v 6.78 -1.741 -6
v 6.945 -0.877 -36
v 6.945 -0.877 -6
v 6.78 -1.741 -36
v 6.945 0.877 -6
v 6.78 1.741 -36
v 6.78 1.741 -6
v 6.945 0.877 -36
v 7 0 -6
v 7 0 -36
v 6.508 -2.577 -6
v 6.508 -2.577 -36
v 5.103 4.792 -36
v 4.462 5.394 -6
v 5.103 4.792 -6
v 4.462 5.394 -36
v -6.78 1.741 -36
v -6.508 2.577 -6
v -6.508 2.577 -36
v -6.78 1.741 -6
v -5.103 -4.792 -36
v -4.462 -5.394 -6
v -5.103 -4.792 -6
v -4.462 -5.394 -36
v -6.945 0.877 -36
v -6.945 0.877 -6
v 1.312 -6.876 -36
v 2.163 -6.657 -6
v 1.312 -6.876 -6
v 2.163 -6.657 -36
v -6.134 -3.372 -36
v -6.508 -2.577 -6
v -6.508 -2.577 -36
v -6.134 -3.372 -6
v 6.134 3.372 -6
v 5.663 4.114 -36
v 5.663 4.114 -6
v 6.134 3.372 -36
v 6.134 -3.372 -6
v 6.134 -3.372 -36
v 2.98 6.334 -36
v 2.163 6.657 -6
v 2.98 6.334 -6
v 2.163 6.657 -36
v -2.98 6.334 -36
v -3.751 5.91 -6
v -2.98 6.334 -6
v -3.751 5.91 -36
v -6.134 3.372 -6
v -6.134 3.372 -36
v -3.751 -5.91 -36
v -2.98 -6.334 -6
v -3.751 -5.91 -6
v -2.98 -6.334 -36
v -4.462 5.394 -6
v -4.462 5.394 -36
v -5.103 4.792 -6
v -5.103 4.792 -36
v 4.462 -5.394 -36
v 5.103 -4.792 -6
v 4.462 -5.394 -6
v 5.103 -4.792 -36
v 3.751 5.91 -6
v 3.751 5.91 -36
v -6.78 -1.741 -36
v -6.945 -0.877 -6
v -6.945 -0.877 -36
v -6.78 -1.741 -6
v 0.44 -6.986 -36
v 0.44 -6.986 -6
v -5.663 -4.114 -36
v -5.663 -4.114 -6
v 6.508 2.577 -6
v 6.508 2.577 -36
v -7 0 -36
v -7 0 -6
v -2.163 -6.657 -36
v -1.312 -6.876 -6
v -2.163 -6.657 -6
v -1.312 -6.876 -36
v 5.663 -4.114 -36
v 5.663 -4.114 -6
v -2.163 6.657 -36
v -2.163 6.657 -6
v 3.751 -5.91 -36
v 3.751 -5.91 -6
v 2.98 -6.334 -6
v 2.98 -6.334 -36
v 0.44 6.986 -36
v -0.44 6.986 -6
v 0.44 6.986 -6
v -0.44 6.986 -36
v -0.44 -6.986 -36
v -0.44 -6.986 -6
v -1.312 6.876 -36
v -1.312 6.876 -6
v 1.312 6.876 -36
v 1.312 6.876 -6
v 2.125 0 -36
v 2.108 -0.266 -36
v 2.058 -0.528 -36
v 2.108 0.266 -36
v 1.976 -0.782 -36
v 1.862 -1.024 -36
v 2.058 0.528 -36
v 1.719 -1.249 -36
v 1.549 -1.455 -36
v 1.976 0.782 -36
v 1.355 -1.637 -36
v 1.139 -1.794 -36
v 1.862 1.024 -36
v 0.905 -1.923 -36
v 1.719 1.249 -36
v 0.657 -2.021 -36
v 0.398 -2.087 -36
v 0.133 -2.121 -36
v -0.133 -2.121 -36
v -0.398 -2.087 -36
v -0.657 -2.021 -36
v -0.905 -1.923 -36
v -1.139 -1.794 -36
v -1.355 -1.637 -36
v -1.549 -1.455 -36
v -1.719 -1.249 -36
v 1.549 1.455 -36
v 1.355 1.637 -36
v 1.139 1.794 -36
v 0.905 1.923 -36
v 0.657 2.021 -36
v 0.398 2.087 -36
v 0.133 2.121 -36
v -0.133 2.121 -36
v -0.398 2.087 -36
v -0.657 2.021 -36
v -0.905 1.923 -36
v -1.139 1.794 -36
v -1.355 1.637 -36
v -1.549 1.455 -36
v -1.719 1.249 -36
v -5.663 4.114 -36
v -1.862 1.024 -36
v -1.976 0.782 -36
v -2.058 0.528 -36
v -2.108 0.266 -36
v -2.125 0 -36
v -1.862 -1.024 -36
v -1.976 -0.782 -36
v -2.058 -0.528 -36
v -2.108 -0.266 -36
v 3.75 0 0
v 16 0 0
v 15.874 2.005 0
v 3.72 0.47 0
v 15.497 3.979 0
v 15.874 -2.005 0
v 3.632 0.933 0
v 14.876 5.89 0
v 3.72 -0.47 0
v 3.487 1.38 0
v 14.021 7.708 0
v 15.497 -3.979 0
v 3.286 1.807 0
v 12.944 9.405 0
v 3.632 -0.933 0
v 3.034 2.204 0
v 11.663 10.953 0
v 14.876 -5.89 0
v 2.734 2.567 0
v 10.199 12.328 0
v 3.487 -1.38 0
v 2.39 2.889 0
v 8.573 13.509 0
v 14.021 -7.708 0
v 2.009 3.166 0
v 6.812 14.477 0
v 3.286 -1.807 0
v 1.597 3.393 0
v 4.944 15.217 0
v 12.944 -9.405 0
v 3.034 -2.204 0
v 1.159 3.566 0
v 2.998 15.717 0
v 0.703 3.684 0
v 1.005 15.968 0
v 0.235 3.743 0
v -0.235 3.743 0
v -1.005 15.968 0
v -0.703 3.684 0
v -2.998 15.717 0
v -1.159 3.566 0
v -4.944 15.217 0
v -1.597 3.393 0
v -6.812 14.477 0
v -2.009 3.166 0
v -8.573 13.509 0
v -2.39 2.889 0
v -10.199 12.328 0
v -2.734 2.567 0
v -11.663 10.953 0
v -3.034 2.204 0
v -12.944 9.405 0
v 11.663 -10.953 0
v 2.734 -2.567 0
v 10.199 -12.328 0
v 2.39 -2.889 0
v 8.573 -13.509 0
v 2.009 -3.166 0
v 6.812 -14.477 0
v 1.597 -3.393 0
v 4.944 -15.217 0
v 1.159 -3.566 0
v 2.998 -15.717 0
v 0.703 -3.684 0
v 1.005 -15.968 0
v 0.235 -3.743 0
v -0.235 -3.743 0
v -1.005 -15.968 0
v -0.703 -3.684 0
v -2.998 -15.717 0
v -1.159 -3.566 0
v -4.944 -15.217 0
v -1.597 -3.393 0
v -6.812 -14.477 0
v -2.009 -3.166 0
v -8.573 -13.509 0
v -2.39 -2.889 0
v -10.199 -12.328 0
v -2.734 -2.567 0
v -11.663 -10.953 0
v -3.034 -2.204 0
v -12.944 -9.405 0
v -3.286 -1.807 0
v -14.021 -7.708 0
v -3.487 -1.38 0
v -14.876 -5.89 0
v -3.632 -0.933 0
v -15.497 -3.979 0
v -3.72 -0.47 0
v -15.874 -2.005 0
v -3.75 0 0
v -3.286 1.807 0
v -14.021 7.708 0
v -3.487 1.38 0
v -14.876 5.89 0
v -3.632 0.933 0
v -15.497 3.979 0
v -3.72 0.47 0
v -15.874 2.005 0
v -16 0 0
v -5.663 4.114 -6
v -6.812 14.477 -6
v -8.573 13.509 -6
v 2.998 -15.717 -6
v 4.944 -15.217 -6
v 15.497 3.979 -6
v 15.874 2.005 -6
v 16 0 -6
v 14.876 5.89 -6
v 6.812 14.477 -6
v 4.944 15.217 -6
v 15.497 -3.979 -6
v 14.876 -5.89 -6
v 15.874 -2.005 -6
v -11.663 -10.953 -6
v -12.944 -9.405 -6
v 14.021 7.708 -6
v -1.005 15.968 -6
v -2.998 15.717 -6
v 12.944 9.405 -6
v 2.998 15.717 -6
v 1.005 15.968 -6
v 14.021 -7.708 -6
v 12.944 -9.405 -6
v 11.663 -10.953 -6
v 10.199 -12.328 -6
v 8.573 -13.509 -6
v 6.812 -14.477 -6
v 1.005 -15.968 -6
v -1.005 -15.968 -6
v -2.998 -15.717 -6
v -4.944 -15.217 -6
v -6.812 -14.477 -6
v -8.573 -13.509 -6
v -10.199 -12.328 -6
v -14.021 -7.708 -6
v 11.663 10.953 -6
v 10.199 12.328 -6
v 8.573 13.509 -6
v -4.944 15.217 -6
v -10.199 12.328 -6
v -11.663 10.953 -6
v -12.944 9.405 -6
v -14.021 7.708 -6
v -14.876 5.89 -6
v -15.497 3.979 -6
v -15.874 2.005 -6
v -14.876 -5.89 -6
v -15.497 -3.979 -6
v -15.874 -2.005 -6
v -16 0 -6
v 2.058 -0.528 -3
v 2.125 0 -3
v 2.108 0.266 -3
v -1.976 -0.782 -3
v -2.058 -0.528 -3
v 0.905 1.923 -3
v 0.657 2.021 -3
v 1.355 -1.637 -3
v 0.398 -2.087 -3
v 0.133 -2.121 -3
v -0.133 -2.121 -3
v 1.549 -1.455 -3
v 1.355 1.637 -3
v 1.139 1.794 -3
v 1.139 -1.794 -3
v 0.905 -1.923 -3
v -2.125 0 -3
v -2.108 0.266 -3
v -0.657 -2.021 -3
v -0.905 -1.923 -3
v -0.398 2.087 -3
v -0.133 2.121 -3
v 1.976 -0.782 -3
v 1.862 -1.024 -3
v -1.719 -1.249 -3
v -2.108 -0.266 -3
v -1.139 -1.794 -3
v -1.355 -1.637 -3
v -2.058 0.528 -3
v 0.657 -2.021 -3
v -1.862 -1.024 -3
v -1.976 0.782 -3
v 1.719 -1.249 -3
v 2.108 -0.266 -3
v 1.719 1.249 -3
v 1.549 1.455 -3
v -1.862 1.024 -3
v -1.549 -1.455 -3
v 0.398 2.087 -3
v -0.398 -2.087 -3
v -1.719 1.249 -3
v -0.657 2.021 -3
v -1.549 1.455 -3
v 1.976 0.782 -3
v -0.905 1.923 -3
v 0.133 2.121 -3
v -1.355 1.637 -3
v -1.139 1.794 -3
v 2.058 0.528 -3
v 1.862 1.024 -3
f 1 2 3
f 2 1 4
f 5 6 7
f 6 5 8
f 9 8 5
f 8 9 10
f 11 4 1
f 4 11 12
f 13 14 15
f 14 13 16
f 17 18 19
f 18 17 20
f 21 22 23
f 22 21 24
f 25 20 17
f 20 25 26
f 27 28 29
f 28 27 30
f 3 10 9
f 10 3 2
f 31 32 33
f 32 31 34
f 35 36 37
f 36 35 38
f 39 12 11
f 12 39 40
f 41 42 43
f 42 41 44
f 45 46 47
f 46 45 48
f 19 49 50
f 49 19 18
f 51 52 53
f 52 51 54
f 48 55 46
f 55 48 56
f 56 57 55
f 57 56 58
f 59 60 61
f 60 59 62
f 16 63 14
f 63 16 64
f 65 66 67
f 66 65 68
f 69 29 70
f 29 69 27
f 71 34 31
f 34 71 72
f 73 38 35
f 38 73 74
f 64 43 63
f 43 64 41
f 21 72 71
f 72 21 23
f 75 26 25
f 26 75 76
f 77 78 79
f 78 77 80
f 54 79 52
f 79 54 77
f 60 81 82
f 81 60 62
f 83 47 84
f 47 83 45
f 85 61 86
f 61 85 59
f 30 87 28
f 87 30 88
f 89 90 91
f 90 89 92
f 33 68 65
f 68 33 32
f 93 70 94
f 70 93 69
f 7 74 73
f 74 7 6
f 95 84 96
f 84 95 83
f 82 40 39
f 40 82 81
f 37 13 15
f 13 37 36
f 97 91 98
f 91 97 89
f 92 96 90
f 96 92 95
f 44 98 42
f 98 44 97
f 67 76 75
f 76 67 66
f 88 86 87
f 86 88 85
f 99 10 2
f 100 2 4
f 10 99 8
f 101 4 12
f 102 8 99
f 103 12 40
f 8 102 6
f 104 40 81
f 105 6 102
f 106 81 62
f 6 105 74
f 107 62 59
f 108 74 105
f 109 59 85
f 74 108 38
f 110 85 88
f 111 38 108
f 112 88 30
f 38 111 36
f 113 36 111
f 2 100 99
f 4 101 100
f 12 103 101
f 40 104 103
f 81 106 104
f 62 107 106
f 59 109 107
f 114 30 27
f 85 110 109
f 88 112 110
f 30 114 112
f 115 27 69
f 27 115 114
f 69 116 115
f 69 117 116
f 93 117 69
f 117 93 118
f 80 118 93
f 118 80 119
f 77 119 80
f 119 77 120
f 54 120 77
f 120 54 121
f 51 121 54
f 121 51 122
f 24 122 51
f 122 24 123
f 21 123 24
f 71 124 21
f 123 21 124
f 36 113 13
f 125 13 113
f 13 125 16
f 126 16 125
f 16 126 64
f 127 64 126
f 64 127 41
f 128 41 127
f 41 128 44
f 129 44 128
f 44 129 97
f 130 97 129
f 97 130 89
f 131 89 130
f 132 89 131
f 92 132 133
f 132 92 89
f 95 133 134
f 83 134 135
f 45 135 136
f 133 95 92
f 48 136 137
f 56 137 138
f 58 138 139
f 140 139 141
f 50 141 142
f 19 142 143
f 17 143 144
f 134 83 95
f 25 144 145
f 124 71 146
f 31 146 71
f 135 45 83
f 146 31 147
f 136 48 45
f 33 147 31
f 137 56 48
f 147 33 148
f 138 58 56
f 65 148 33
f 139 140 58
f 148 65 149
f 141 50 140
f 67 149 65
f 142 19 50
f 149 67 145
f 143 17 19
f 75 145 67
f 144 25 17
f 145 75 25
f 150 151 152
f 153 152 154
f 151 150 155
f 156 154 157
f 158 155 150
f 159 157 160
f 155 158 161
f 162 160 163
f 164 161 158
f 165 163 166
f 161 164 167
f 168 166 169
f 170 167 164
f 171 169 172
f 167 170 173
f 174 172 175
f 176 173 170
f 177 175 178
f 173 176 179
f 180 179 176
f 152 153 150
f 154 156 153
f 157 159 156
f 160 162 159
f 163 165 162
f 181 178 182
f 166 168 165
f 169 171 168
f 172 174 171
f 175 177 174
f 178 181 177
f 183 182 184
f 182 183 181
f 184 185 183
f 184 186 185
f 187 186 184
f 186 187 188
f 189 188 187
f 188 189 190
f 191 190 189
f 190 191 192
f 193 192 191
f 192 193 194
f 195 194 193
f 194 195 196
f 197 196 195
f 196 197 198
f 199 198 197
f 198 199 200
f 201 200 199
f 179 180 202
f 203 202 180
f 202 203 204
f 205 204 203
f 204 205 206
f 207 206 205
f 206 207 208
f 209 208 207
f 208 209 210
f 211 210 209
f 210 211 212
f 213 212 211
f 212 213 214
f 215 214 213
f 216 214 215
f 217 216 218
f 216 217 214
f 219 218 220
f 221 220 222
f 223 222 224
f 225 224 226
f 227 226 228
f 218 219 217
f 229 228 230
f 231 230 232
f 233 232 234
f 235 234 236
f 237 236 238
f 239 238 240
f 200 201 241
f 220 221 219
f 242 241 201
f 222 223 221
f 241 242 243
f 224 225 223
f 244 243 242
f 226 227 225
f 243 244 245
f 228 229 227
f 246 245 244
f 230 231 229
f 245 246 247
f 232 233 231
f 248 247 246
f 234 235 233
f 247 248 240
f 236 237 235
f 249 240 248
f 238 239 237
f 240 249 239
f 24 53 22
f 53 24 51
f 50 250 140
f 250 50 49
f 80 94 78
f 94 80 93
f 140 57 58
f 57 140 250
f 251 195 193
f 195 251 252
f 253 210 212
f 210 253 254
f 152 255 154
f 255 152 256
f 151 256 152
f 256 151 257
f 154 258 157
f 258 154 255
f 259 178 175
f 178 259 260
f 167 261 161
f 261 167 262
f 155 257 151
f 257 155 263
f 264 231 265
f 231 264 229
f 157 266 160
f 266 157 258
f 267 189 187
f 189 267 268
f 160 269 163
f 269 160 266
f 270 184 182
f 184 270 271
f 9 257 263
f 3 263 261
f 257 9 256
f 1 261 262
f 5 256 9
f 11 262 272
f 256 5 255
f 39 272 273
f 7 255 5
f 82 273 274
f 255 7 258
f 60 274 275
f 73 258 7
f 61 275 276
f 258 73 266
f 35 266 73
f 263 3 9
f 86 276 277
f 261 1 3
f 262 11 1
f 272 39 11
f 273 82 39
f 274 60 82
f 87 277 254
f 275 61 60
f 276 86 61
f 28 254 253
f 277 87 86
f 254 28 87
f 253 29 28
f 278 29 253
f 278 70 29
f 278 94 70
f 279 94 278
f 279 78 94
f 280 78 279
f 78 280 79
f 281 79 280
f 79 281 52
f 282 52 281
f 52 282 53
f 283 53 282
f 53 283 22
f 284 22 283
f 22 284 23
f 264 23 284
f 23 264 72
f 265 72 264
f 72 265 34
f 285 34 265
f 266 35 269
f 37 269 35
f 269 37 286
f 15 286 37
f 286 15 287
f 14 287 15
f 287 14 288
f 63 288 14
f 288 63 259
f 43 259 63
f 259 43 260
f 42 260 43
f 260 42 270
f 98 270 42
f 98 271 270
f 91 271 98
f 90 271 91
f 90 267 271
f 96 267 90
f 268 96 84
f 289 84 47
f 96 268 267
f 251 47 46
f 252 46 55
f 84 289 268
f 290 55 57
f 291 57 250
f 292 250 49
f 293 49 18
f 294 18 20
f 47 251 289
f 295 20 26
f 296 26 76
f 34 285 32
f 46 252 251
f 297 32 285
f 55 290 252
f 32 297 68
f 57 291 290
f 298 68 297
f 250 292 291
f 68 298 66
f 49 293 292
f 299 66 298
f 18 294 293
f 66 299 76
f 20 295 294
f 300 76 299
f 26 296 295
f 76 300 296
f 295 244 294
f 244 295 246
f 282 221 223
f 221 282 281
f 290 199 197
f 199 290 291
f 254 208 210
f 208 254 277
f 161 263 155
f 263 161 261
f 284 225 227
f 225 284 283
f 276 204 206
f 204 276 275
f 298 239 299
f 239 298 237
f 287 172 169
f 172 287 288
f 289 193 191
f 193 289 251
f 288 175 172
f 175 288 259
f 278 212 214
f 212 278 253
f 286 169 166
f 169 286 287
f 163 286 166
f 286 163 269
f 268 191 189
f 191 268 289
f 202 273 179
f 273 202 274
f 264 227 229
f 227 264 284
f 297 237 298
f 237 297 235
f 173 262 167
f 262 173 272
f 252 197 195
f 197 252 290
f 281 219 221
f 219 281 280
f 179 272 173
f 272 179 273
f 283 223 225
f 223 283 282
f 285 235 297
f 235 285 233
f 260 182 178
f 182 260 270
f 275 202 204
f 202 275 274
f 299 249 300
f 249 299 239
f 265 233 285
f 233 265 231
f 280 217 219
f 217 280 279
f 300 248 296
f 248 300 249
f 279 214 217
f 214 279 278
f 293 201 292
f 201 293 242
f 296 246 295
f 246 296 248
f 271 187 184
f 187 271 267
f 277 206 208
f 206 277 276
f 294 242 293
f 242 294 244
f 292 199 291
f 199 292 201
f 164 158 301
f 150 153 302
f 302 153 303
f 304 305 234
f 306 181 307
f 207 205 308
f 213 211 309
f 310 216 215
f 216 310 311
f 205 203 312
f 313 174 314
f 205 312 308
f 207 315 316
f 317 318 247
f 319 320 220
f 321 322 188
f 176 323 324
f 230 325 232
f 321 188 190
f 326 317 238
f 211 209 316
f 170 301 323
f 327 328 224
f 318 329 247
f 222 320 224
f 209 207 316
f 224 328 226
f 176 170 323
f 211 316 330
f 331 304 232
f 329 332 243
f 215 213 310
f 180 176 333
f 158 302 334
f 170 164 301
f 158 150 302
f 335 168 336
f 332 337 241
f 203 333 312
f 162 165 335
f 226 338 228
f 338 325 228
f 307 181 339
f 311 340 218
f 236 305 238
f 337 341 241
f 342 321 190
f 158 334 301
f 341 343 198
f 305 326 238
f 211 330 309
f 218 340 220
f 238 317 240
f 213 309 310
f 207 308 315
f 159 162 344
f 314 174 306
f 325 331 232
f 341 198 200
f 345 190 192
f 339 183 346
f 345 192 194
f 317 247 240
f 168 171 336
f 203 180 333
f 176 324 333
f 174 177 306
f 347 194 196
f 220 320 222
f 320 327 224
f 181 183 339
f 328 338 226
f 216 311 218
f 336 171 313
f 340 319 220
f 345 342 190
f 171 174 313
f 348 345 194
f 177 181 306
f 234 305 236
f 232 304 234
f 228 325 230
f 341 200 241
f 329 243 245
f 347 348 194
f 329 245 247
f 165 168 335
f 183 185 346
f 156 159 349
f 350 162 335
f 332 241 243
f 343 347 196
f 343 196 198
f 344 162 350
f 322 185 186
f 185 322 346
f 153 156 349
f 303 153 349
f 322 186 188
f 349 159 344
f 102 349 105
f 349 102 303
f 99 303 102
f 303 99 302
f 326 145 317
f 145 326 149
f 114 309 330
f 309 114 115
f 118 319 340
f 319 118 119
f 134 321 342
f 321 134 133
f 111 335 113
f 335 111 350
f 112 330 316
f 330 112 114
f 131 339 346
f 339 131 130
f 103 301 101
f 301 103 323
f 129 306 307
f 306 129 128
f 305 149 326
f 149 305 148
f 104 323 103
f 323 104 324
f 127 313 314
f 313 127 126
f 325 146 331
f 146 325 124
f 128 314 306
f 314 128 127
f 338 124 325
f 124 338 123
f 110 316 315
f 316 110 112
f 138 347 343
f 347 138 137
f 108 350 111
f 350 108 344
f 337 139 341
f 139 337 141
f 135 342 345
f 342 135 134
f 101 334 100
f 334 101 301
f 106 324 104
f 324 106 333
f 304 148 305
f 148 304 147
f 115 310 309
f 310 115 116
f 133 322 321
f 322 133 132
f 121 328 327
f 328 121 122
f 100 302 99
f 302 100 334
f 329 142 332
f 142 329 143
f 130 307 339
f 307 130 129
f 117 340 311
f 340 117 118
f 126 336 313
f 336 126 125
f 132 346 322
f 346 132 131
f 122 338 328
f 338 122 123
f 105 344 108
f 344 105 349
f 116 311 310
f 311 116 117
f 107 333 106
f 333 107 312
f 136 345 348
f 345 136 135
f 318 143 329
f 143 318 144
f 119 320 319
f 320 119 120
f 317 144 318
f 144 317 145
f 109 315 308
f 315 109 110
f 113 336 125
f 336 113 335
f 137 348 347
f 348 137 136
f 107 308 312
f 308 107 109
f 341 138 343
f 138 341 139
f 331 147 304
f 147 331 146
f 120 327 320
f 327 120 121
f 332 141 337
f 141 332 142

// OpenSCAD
$fn = 50;


difference() {
	union() {
		translate(v = [0, 0, -36.0000000000]) {
			cylinder(h = 36, r = 7.0000000000);
		}
		translate(v = [0, 0, -6.0000000000]) {
			cylinder(h = 6, r = 16.0000000000);
		}
	}
	union() {
		translate(v = [0, 0, 0]) {
			rotate(a = [0, 0, 0]) {
				difference() {
					union() {
						#translate(v = [0, 0, -36.0000000000]) {
							cylinder(h = 36, r = 2.0000000000);
						}
						#translate(v = [0, 0, -3]) {
							cylinder(h = 3, r = 7.0000000000, r1 = 2.1250000000, r2 = 3.7500000000);
						}
						#translate(v = [0, 0, -36.0000000000]) {
							cylinder(h = 36, r = 2.1250000000);
						}
						#translate(v = [0, 0, -36.0000000000]) {
							cylinder(h = 36, r = 2.0000000000);
						}
					}
					union();
				}
			}
		}
	}
}
